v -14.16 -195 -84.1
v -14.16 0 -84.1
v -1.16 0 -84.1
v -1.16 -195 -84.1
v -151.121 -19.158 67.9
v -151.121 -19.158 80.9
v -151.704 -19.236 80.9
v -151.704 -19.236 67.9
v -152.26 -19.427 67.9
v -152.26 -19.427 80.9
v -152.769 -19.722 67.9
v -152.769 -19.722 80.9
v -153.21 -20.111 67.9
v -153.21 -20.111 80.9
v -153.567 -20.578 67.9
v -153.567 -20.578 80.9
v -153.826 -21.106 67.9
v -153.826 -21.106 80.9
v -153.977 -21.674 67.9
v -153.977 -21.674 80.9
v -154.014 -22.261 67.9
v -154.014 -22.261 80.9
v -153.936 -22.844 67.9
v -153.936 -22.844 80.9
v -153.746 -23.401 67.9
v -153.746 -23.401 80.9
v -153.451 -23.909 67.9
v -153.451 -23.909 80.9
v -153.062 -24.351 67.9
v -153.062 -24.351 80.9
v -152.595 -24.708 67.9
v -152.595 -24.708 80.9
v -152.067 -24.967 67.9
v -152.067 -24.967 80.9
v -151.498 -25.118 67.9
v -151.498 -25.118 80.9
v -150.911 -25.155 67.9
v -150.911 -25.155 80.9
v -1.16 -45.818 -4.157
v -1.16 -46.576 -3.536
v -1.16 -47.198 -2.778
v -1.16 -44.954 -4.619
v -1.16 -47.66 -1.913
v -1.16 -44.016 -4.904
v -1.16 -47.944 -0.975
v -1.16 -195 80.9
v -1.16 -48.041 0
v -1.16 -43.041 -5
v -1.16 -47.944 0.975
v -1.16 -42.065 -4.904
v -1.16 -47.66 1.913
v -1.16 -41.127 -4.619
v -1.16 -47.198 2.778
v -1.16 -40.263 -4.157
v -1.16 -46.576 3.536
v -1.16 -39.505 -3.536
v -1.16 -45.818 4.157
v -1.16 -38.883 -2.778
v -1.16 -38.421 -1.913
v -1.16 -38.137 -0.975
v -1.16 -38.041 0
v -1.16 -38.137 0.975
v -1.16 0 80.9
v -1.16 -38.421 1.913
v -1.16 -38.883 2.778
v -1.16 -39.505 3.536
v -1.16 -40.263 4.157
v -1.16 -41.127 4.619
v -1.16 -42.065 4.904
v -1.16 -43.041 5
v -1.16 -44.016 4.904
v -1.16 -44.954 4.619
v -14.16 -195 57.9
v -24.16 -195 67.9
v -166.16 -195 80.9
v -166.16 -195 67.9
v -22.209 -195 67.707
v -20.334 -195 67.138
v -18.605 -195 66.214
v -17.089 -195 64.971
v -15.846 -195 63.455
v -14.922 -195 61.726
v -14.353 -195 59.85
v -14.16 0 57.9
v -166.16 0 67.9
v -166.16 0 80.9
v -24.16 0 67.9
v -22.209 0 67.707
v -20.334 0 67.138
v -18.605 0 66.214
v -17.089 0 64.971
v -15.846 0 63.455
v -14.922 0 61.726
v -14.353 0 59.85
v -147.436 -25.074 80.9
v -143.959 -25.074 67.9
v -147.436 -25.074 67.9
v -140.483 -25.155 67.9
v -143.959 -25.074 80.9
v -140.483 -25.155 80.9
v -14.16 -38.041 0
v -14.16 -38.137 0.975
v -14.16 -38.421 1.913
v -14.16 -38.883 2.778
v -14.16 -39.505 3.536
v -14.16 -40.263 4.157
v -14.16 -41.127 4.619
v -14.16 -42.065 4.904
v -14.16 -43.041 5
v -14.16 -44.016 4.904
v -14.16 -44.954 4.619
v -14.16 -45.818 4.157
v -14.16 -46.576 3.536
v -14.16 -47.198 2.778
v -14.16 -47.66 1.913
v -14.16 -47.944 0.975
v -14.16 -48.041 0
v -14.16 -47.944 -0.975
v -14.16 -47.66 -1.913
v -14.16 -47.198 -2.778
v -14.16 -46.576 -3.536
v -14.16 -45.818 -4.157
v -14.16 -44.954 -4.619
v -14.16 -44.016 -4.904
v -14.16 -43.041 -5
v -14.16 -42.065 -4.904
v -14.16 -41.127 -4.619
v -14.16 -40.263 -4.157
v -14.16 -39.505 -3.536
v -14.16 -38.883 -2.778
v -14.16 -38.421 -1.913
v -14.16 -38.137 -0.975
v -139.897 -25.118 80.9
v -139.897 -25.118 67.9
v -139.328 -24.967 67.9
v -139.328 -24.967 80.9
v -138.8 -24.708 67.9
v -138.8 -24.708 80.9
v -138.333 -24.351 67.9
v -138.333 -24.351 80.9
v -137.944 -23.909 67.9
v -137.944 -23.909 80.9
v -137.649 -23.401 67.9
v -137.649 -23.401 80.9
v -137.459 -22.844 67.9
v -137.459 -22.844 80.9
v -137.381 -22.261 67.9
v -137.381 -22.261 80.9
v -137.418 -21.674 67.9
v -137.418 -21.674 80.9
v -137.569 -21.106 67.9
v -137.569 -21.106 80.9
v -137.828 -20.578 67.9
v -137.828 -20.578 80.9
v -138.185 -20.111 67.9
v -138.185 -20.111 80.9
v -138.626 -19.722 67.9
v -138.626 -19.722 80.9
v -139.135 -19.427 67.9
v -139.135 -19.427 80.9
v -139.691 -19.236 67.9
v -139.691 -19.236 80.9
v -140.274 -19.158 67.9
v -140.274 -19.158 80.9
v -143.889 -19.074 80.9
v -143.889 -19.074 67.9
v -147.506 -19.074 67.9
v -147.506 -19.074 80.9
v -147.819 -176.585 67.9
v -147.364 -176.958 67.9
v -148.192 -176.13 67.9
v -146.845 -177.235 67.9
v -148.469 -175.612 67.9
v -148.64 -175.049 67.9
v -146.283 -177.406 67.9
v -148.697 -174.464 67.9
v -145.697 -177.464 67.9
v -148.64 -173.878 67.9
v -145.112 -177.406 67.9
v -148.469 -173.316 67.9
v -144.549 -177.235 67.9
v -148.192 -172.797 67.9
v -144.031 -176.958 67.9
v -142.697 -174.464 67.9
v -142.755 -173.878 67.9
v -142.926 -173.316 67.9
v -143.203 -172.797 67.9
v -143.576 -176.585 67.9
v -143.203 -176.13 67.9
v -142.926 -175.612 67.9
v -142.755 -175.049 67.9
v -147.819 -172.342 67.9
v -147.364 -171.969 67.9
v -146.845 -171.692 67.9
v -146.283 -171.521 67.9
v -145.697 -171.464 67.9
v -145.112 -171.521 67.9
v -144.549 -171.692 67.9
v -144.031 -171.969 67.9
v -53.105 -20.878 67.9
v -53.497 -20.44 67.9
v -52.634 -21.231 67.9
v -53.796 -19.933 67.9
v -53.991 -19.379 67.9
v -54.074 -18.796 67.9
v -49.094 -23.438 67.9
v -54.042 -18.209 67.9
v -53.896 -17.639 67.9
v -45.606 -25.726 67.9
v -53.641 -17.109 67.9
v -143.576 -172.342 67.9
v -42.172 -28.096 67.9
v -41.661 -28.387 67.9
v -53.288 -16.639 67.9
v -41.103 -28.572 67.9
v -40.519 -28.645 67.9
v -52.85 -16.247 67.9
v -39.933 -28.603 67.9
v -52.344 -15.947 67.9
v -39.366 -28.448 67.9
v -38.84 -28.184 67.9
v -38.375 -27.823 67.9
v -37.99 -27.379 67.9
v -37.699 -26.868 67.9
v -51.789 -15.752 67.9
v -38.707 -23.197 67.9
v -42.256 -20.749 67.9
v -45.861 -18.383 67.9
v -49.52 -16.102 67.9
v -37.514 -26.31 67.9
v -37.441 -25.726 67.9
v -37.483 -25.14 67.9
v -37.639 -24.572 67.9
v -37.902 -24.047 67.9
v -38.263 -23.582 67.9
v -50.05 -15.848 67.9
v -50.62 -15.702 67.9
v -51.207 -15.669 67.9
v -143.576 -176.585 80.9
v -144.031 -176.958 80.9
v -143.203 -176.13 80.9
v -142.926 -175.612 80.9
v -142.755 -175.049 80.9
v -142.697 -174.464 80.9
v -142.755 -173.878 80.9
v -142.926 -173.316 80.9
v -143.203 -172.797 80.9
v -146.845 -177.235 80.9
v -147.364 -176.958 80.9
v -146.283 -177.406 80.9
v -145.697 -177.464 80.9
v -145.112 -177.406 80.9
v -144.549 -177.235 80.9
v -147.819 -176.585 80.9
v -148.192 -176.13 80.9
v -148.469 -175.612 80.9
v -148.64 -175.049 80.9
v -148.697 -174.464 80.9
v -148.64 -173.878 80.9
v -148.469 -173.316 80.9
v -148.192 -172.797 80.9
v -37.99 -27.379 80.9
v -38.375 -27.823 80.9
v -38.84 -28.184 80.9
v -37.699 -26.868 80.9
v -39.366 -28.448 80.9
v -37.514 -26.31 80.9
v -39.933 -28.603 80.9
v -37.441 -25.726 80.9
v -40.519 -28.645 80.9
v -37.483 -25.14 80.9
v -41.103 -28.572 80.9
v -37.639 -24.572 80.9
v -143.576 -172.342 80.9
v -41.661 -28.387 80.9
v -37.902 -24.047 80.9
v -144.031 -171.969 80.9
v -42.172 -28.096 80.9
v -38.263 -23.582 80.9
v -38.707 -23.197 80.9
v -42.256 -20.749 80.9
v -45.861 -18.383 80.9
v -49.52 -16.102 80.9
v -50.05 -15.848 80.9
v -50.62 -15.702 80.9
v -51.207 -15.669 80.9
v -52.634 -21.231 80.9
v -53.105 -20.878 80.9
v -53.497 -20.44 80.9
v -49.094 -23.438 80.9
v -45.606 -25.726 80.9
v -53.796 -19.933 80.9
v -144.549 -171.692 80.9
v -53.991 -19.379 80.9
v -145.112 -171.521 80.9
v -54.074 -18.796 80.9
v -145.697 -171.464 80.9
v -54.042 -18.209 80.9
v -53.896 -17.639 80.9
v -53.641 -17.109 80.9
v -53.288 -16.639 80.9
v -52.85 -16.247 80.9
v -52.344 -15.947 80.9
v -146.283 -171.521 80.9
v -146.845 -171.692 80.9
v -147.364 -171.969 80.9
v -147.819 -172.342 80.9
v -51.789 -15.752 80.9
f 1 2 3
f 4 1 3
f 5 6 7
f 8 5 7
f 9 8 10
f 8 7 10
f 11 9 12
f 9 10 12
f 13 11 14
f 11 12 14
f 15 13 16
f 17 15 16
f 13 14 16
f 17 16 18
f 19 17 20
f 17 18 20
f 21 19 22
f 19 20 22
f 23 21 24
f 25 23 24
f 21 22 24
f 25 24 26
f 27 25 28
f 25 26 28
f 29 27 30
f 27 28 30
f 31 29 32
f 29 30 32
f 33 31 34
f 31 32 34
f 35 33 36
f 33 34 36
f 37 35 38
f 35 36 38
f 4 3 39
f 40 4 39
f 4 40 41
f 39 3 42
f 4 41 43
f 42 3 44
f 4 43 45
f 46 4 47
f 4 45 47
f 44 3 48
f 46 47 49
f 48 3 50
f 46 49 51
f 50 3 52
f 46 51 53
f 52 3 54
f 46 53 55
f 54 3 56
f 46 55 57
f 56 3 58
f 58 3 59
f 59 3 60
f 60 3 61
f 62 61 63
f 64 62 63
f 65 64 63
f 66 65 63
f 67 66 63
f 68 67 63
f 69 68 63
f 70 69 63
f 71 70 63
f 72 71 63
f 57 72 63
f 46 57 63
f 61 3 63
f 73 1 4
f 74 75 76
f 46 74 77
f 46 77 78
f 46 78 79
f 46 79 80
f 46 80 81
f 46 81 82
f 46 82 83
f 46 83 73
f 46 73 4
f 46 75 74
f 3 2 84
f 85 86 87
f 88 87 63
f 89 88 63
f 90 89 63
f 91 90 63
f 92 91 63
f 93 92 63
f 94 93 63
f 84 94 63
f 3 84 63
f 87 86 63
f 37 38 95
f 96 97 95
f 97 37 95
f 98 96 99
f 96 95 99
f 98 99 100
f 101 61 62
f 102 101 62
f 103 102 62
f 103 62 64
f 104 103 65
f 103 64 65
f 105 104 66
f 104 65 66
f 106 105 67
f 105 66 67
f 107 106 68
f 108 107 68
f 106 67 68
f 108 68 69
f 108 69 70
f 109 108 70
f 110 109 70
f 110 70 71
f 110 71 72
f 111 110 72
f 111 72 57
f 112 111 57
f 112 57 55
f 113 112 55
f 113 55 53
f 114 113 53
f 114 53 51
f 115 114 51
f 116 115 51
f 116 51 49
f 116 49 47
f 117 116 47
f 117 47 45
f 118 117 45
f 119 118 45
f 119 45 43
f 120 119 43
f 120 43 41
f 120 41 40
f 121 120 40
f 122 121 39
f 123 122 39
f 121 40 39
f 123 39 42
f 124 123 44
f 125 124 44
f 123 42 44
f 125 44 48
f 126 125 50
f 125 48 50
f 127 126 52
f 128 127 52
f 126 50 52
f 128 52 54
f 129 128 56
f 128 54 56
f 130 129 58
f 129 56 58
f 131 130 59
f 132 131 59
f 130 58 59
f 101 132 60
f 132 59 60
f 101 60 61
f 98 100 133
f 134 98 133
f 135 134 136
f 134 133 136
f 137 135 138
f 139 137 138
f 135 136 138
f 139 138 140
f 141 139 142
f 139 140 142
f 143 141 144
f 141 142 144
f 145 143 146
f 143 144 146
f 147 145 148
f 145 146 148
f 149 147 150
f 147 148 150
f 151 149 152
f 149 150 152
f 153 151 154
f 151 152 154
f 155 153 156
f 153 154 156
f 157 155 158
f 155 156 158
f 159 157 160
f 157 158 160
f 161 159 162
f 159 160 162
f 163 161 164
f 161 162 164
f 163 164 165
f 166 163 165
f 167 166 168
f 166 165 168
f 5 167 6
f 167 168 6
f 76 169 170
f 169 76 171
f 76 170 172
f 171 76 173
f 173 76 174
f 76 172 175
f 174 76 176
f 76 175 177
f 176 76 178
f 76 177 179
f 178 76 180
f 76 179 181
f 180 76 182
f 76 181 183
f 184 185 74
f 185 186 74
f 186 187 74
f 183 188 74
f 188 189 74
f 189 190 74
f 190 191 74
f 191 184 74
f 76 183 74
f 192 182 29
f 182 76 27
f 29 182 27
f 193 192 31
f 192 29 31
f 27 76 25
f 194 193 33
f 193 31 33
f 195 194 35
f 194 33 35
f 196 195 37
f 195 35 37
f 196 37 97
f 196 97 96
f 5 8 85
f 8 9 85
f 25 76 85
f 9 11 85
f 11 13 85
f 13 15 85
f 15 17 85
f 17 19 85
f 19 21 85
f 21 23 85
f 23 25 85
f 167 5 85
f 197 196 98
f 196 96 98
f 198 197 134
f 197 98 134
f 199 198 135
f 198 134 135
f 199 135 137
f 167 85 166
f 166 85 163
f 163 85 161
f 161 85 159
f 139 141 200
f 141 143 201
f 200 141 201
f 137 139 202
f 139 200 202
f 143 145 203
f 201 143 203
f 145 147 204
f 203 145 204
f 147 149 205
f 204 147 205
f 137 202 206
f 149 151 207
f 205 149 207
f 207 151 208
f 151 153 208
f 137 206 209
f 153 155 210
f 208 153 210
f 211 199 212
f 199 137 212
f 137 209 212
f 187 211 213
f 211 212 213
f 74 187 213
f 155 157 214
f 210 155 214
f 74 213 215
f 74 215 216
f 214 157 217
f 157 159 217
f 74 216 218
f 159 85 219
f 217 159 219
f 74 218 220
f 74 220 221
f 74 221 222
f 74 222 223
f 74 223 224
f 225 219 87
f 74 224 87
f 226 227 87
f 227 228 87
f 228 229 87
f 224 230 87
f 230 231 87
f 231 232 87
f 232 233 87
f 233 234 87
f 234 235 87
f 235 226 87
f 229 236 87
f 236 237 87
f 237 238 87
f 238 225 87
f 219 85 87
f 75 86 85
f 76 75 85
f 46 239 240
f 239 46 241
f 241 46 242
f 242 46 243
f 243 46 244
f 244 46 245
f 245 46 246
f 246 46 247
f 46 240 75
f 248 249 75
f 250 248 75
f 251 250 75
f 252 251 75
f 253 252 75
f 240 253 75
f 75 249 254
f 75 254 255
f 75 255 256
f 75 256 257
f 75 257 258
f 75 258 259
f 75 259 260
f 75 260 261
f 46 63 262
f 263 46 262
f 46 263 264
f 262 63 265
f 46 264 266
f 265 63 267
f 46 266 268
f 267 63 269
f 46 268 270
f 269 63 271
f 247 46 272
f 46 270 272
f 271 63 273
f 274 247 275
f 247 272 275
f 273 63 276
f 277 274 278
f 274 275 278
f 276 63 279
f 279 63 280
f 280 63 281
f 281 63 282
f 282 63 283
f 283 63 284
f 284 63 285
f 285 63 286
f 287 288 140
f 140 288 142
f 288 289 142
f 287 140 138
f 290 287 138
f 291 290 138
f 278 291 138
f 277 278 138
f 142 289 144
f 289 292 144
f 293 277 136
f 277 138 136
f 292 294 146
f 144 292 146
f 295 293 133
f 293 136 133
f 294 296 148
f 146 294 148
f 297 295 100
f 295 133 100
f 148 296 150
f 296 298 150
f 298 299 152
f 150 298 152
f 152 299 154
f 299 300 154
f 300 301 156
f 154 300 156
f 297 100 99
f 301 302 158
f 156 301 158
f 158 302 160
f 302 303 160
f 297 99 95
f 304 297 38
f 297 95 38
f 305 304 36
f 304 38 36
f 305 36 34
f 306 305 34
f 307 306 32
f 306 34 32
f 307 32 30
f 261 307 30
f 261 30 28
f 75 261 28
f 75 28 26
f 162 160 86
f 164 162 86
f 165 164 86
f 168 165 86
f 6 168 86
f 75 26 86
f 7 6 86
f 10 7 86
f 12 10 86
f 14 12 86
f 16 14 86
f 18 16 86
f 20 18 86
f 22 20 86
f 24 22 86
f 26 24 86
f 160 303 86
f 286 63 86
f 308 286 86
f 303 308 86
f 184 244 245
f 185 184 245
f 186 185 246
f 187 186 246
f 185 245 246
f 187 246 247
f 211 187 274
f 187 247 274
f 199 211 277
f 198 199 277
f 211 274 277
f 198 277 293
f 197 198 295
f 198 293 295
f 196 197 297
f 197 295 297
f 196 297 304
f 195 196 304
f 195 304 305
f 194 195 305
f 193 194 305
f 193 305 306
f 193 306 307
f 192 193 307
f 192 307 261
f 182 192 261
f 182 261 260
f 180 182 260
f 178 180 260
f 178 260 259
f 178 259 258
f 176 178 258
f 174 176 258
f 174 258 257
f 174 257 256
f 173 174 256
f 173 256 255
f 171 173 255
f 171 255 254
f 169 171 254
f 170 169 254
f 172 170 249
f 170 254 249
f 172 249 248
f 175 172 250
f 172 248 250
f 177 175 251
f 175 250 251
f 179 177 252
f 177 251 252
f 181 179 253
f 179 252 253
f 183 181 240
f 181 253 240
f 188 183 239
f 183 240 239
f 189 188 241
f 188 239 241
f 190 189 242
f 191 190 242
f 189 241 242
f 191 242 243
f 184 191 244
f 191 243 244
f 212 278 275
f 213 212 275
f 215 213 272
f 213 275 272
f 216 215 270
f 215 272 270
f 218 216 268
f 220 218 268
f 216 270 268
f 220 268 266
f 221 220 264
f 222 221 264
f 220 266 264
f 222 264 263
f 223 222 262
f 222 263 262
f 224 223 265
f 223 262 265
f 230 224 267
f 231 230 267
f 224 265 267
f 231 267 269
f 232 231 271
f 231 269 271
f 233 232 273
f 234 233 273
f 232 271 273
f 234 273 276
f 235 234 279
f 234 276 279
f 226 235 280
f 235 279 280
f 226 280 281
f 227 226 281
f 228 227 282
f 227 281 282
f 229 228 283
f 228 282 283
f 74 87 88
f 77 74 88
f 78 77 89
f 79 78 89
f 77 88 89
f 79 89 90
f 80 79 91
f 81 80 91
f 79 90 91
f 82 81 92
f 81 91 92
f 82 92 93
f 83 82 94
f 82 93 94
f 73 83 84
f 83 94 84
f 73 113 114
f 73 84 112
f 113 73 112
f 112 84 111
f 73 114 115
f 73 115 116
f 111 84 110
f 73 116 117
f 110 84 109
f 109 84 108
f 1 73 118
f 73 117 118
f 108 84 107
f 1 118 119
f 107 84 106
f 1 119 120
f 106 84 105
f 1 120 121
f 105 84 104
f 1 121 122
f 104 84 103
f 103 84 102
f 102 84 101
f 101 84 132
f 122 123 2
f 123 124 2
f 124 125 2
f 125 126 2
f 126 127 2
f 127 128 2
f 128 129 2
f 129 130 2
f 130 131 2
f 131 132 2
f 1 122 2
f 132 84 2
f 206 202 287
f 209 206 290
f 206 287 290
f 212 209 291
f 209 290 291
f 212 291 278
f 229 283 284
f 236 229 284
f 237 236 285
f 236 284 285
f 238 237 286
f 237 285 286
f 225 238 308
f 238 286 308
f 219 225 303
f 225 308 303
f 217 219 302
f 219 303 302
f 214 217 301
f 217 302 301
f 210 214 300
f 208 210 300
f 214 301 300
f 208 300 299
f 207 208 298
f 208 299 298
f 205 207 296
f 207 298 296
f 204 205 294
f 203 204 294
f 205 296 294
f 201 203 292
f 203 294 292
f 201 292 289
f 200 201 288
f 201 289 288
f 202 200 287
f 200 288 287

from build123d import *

# Parameters (mm, degrees)
F1_DEPTH = 195
F2_R     = 3
F3_DEPTH = 25
F4_R     = 5
F5_DEPTH = 25


with BuildPart() as f1:
    # F0 (on Front) → F1 (new body)
    with BuildSketch(Plane.XZ):
        with BuildLine():
            Line((-1.160396, -84.100497), (-1.160396, 80.899503))
            Line((-1.160396, 80.899503), (-166.160396, 80.899503))
            Line((-166.160396, 80.899503), (-166.160396, 67.899503))
            Line((-166.160396, 67.899503), (-24.160396, 67.899503))
            ThreePointArc((-24.160396, 67.899503), (-17.089328, 64.970571), (-14.160396, 57.899503))
            Line((-14.160396, 57.899503), (-14.160396, -84.100497))
            Line((-14.160396, -84.100497), (-1.160396, -84.100497))
        make_face()
    extrude(amount=F1_DEPTH)

    # F2 (on face) → F3 (cut)
    with BuildSketch(Plane.XY.offset(80.899503)):
        with BuildLine():
            ThreePointArc((-150.911415, -25.154715), (-145.69743, -25.063704), (-140.483445, -25.154715))
            ThreePointArc((-140.483445, -25.154715), (-137.380574, -22.261241), (-140.274048, -19.15837))
            ThreePointArc((-140.274048, -19.15837), (-145.69743, -19.063704), (-151.120812, -19.15837))
            ThreePointArc((-151.120812, -19.15837), (-154.014286, -22.261241), (-150.911415, -25.154715))
        make_face()
        with BuildLine():
            ThreePointArc((-38.707305, -23.19722), (-44.051604, -19.555466), (-49.519744, -16.102444))
            ThreePointArc((-49.519744, -16.102444), (-53.641179, -17.109306), (-52.634317, -21.230741))
            ThreePointArc((-52.634317, -21.230741), (-47.343255, -24.571942), (-42.172023, -28.095764))
            ThreePointArc((-42.172023, -28.095764), (-37.990392, -27.378851), (-38.707305, -23.19722))
        make_face()
        with Locations((-145.69743, -174.463704)):
            Circle(F2_R)
    extrude(amount=-F3_DEPTH, mode=Mode.SUBTRACT)

    # F4 (on face) → F5 (cut)
    with BuildSketch(Plane.YZ.offset(-1.160396)):
        with Locations((-43.040507, 0)):
            Circle(F4_R)
    extrude(amount=-F5_DEPTH, mode=Mode.SUBTRACT)


solid = f1.part
